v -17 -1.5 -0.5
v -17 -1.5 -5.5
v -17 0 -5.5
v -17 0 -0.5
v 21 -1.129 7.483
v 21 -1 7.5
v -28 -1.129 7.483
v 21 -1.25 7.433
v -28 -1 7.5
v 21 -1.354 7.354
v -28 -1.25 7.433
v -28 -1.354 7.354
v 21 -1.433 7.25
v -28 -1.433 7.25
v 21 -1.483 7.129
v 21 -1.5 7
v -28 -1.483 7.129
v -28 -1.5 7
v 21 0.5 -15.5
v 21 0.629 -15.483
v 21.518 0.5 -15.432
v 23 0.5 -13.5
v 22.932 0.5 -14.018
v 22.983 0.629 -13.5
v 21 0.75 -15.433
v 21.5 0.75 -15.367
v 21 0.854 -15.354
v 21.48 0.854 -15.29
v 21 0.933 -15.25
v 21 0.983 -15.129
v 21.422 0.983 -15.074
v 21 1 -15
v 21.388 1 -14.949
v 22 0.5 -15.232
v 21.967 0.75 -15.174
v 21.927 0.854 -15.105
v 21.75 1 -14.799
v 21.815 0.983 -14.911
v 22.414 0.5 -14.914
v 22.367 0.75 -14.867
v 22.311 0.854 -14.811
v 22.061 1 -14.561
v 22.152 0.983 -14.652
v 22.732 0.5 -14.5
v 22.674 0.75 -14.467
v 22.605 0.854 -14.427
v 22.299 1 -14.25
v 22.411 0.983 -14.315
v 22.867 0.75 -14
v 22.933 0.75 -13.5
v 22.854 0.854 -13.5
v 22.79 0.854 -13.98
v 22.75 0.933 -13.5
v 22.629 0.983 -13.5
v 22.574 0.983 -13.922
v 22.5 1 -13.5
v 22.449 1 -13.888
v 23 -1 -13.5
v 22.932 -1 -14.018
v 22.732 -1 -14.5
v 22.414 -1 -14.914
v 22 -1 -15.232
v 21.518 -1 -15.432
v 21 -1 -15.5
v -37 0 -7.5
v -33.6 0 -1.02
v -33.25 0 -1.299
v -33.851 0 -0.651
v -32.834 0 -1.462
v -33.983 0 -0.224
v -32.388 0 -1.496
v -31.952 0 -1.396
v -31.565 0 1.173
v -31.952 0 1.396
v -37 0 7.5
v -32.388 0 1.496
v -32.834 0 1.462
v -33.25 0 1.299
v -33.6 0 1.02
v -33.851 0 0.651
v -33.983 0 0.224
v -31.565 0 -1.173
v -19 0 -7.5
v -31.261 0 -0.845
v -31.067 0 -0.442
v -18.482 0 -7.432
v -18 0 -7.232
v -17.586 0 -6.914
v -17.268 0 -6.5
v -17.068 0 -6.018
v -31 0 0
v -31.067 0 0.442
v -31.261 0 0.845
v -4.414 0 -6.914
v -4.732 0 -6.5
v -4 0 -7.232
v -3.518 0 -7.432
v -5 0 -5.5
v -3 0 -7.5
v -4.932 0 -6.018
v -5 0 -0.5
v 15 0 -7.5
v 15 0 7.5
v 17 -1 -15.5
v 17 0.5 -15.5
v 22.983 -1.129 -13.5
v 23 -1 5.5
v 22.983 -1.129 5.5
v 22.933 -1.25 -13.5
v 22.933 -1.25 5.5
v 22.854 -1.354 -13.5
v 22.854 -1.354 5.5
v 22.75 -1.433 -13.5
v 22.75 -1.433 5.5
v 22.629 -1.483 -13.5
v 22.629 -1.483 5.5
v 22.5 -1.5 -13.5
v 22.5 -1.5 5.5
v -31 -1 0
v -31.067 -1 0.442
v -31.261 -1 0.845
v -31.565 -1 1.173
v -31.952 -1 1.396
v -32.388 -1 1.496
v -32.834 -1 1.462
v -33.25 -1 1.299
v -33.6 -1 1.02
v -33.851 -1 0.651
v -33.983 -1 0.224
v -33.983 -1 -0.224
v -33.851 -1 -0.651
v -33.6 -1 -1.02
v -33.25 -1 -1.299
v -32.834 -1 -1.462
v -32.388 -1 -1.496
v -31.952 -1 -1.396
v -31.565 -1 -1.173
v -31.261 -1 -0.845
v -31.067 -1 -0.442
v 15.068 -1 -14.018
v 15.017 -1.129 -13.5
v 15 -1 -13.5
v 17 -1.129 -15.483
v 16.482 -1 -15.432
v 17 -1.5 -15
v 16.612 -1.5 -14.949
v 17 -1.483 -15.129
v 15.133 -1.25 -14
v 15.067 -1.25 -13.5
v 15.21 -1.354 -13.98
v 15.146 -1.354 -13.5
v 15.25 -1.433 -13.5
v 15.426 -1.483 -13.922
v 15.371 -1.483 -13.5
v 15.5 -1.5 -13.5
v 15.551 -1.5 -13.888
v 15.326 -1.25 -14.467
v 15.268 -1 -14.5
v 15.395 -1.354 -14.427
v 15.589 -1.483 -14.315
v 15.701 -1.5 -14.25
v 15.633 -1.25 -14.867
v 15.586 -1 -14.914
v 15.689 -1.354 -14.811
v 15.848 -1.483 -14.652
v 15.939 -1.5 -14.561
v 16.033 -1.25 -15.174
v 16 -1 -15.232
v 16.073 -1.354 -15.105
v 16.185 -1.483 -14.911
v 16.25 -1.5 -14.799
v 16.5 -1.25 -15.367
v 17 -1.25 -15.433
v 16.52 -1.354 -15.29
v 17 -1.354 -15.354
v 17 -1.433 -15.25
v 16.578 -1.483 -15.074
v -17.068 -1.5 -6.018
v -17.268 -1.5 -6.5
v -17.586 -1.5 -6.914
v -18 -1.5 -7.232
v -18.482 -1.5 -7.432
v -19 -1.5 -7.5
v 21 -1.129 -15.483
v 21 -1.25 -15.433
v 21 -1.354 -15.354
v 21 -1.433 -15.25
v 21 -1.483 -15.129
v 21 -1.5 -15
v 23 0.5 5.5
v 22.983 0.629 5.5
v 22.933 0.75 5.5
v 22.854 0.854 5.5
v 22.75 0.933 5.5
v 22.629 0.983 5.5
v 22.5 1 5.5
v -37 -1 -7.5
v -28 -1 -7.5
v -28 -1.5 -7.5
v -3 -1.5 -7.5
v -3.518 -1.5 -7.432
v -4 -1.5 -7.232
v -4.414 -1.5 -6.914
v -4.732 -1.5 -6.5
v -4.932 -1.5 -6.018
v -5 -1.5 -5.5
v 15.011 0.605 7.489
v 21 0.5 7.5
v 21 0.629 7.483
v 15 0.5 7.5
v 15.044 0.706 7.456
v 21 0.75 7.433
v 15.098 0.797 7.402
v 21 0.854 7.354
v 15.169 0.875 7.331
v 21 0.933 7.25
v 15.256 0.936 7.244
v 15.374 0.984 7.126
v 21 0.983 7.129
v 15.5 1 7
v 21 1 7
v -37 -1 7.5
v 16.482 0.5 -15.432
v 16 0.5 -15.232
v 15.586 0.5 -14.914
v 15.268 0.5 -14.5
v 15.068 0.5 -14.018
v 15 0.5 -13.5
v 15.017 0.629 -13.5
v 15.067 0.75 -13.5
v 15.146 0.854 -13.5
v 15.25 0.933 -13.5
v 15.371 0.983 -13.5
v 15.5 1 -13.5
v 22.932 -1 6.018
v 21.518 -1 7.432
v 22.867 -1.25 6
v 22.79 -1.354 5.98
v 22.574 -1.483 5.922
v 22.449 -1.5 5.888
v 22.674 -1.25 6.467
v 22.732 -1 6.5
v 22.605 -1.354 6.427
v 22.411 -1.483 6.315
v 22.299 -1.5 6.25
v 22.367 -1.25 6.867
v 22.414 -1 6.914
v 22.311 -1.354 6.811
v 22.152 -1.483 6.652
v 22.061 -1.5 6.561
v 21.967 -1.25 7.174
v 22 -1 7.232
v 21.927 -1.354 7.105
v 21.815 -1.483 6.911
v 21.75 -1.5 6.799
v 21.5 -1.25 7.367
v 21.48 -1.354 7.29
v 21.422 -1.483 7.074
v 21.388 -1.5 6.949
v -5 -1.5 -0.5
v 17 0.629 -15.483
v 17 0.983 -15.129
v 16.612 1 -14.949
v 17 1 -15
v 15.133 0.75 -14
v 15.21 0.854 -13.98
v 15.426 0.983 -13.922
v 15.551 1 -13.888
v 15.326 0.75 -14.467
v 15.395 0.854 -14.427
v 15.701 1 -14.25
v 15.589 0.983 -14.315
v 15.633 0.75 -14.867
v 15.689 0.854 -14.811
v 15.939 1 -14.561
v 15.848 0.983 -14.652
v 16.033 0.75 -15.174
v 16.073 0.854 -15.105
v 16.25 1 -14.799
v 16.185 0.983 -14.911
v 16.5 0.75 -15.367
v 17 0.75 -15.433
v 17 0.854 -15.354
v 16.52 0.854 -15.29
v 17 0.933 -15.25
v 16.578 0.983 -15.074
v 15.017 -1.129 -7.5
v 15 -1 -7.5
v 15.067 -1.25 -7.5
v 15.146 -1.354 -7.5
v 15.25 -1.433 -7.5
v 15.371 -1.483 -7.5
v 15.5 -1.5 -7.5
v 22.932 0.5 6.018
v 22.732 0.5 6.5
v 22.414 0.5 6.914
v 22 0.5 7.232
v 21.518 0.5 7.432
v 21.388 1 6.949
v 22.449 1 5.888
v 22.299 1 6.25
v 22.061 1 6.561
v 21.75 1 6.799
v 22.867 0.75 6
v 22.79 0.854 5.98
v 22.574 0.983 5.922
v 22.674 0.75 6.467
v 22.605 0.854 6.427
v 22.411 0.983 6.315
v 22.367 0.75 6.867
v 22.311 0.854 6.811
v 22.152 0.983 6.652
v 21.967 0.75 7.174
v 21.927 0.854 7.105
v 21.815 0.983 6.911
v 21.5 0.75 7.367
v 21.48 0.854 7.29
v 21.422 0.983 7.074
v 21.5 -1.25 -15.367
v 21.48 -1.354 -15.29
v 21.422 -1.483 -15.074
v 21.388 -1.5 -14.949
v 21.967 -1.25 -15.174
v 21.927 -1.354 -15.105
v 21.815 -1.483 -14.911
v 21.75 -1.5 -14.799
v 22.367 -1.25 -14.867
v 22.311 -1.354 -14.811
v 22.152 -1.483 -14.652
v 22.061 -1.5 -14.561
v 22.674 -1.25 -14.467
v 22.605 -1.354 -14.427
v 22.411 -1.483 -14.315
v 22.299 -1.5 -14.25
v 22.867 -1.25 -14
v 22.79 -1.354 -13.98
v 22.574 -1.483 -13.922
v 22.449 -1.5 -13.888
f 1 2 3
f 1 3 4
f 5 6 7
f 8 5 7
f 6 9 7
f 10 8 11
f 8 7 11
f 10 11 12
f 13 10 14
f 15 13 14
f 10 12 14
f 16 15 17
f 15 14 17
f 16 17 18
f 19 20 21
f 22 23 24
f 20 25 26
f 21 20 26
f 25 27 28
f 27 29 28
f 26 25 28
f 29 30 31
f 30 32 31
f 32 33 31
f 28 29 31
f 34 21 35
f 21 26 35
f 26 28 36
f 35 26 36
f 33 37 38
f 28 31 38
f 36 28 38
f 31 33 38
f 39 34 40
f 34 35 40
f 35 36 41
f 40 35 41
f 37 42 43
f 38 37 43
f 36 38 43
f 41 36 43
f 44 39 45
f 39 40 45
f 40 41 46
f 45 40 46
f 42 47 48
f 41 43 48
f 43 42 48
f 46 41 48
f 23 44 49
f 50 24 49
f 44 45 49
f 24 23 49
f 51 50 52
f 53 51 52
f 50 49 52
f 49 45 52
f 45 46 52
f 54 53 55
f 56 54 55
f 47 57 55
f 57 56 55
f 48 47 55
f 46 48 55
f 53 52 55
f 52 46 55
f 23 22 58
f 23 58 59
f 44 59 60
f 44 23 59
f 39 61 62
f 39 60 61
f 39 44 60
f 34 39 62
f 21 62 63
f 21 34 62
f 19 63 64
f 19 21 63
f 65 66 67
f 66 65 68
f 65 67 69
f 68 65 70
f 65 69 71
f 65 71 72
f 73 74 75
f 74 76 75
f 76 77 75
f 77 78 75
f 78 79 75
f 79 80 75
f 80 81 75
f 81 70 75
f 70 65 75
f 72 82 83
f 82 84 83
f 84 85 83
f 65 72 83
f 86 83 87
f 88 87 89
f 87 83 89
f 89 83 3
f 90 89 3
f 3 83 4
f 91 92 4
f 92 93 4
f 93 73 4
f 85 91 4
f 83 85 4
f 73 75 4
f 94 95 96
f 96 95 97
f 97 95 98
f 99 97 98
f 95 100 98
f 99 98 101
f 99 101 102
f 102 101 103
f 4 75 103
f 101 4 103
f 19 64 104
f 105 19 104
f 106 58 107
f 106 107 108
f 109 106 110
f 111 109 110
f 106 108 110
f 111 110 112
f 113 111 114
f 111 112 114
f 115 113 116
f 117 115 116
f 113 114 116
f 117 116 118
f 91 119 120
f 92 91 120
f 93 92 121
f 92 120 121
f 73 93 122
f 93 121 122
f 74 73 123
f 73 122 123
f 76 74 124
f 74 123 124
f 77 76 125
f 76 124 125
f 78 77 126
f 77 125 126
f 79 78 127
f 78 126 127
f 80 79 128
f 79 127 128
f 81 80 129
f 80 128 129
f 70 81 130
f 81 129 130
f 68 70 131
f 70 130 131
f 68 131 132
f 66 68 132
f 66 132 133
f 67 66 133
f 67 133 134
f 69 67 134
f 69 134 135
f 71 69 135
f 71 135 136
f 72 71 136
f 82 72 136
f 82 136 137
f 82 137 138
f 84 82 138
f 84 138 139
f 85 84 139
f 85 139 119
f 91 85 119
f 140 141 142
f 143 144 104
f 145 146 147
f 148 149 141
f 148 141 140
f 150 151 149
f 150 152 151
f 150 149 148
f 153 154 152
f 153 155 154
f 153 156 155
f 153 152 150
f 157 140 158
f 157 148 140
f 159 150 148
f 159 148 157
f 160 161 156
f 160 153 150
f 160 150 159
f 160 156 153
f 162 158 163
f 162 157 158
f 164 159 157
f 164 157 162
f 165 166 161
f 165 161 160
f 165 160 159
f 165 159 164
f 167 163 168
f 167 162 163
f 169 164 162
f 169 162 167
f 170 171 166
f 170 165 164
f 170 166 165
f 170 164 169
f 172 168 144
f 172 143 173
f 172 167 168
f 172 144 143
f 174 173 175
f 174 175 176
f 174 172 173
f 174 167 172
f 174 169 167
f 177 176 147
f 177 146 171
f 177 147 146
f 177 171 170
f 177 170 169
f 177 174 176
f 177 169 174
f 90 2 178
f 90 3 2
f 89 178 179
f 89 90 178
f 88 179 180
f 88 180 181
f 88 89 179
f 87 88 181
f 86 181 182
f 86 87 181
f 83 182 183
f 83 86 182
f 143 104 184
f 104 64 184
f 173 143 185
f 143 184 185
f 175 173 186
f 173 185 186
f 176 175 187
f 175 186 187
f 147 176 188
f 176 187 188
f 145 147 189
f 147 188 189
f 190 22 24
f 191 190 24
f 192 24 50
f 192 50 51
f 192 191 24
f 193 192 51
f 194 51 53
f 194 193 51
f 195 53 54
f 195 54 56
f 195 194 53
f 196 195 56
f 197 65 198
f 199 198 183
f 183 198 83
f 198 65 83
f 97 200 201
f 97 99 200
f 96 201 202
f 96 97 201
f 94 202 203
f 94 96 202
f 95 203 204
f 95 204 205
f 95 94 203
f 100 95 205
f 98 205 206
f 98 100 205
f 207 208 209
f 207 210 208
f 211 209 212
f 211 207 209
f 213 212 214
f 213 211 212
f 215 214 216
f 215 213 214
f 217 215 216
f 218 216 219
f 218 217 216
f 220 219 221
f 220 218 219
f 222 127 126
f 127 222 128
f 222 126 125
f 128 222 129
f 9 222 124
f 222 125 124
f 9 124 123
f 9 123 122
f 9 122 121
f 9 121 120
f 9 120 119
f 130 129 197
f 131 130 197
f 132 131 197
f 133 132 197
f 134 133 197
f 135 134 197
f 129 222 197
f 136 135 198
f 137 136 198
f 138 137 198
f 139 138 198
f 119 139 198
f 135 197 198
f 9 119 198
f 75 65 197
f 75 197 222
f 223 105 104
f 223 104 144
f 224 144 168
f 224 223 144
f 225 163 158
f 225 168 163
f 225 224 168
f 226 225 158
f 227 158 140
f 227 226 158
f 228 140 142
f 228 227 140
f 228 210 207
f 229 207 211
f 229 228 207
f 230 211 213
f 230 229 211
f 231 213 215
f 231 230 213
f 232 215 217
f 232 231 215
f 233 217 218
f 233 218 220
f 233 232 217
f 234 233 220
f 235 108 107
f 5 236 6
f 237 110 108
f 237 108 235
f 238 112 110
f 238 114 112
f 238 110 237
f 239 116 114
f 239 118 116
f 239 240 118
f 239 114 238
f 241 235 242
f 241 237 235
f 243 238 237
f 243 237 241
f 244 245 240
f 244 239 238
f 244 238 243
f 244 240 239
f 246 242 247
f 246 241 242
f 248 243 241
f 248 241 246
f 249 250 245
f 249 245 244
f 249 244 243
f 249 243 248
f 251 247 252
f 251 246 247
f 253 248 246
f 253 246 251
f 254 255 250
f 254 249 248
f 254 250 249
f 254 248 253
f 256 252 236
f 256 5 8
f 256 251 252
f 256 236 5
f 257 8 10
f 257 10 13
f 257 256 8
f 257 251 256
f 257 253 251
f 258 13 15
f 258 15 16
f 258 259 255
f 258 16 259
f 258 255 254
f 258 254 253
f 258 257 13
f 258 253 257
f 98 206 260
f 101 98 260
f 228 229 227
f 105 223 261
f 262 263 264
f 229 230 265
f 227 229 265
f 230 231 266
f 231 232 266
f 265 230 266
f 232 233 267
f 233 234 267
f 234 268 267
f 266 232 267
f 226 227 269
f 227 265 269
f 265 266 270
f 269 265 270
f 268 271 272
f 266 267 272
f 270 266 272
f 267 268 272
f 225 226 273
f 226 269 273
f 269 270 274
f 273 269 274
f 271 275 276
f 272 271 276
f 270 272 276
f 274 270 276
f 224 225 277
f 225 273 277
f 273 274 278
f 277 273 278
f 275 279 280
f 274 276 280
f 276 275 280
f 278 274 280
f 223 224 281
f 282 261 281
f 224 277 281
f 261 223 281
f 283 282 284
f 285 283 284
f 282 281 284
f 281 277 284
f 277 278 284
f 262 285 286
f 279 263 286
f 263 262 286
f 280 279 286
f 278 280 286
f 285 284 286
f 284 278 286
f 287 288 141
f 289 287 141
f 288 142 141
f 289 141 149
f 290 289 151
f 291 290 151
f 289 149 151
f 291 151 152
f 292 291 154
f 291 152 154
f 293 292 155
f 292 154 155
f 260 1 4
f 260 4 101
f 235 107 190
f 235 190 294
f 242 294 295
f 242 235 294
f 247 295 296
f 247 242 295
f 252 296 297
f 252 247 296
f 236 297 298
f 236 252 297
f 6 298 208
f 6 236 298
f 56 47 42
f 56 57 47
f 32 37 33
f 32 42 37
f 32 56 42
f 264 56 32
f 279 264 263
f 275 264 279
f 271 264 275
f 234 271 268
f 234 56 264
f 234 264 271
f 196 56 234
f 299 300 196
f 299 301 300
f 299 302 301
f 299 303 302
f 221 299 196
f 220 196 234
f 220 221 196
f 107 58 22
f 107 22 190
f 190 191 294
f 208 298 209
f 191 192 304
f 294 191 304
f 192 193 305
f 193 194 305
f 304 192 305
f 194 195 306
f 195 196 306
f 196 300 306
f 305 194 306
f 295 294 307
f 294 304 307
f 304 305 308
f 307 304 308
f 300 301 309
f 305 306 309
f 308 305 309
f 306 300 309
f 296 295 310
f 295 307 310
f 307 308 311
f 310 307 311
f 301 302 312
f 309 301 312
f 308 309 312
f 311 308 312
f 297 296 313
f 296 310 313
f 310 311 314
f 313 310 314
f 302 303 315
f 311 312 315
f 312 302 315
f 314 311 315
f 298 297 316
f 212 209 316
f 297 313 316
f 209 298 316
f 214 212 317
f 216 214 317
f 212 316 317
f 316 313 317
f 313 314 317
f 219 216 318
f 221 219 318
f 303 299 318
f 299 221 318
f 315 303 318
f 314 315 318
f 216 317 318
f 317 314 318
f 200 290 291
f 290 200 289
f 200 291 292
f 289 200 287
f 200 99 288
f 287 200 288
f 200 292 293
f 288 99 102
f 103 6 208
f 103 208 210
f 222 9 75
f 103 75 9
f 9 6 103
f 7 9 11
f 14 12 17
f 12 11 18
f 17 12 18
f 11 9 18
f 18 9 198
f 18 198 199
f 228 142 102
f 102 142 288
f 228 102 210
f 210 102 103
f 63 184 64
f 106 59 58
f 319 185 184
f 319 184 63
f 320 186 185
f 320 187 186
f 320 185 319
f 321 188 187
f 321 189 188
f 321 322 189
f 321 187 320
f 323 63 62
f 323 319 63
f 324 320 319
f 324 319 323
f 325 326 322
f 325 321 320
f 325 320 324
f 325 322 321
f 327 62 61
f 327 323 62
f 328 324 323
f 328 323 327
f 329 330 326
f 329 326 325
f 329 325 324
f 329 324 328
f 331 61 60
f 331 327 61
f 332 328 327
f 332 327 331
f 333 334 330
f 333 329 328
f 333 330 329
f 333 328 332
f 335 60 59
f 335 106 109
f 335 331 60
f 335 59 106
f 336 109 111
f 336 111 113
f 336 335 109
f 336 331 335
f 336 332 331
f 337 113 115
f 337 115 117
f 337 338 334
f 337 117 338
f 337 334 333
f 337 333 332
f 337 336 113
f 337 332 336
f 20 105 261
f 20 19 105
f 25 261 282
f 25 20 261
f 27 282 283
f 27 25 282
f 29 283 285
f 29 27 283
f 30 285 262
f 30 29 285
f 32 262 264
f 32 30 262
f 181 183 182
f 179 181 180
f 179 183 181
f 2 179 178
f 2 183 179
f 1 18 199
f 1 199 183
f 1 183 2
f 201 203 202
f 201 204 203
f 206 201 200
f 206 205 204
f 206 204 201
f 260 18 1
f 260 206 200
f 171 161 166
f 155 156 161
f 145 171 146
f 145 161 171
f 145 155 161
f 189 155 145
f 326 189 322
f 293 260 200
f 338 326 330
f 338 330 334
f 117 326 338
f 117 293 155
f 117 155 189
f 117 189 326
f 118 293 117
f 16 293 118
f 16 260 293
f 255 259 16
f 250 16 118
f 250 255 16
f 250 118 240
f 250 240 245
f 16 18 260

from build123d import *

# Parameters (mm, degrees)
F0_W      = 62
F0_H      = 15
F1_DEPTH  = 1.5
F2_W      = 10
F2_H      = 8
F3_DEPTH  = 1.5
F4_W      = 12
F4_H      = 7
F5_DEPTH  = 1.501
F6_R      = 1.5
F7_DEPTH  = 1.501
F8_W      = 9
F8_H      = 0.5
F9_DEPTH  = 15.001
F10_W     = 2
F10_H     = 1.5
F11_DEPTH = 23.001
F12_W     = 8
F12_H     = 23
F13_DEPTH = 1
F14_R     = 2
F15_R     = 0.5


with BuildPart() as f1:
    # F0 (on Front) → F1 (new body)
    with BuildSketch(Plane.XZ):
        with Locations((-6, 0)):
            Rectangle(F0_W, F0_H)
    extrude(amount=F1_DEPTH)

    # F2 (on face) → F3 (join, through all)
    with BuildSketch(Plane.XZ.offset(1.5)):
        with Locations((20, -11.5)):
            Rectangle(F2_W, F2_H)
    extrude(amount=-F3_DEPTH)

    # F4 (on face) → F5 (cut, through all)
    with BuildSketch(Plane.XZ.offset(1.5)):
        with Locations((-11, -4)):
            Rectangle(F4_W, F4_H)
    extrude(amount=-F5_DEPTH, mode=Mode.SUBTRACT)

    # F6 (on face) → F7 (cut, through all)
    with BuildSketch(Plane.XZ.offset(1.5)):
        with Locations((-32.5, 0)):
            Circle(F6_R)
    extrude(amount=-F7_DEPTH, mode=Mode.SUBTRACT)

    # F8 (on face) → F9 (cut, through all)
    with BuildSketch(Plane(origin=(0, 0, -7.5), x_dir=(1, 0, 0), z_dir=(0, 0, -1))):
        with Locations((-32.5, 1.25)):
            Rectangle(F8_W, F8_H)
    extrude(amount=-F9_DEPTH, mode=Mode.SUBTRACT)

    # F10 (on face) → F11 (cut, through all)
    with BuildSketch(Plane(origin=(0, 0, -15.5), x_dir=(1, 0, 0), z_dir=(0, 0, -1))):
        with Locations((24, 0.75)):
            Rectangle(F10_W, F10_H)
    extrude(amount=-F11_DEPTH, mode=Mode.SUBTRACT)

    # F12 (on face) → F13 (join)
    with BuildSketch(Plane(origin=(0, 0, 0), x_dir=(-1, 0, 0), z_dir=(0, 1, 0))):
        with Locations((-19, -4)):
            Rectangle(F12_W, F12_H)
    extrude(amount=F13_DEPTH)

    # F14
    f14_edges = [f1.edges().sort_by_distance(p)[0] for p in [
        (15, -0.25, -15.5),
        (23, -0.25, -15.5),
        (23, -0.25, 7.5),
        (-5, -0.75, -7.5),
        (-17, -0.75, -7.5),
    ]]
    fillet(f14_edges, radius=F14_R)

    # F15
    f15_edges = [f1.edges().sort_by_distance(p)[0] for p in [
        (23, 1, -4),
        (23, -1.5, -4),
    ]]
    fillet(f15_edges, radius=F15_R)


solid = f1.part
